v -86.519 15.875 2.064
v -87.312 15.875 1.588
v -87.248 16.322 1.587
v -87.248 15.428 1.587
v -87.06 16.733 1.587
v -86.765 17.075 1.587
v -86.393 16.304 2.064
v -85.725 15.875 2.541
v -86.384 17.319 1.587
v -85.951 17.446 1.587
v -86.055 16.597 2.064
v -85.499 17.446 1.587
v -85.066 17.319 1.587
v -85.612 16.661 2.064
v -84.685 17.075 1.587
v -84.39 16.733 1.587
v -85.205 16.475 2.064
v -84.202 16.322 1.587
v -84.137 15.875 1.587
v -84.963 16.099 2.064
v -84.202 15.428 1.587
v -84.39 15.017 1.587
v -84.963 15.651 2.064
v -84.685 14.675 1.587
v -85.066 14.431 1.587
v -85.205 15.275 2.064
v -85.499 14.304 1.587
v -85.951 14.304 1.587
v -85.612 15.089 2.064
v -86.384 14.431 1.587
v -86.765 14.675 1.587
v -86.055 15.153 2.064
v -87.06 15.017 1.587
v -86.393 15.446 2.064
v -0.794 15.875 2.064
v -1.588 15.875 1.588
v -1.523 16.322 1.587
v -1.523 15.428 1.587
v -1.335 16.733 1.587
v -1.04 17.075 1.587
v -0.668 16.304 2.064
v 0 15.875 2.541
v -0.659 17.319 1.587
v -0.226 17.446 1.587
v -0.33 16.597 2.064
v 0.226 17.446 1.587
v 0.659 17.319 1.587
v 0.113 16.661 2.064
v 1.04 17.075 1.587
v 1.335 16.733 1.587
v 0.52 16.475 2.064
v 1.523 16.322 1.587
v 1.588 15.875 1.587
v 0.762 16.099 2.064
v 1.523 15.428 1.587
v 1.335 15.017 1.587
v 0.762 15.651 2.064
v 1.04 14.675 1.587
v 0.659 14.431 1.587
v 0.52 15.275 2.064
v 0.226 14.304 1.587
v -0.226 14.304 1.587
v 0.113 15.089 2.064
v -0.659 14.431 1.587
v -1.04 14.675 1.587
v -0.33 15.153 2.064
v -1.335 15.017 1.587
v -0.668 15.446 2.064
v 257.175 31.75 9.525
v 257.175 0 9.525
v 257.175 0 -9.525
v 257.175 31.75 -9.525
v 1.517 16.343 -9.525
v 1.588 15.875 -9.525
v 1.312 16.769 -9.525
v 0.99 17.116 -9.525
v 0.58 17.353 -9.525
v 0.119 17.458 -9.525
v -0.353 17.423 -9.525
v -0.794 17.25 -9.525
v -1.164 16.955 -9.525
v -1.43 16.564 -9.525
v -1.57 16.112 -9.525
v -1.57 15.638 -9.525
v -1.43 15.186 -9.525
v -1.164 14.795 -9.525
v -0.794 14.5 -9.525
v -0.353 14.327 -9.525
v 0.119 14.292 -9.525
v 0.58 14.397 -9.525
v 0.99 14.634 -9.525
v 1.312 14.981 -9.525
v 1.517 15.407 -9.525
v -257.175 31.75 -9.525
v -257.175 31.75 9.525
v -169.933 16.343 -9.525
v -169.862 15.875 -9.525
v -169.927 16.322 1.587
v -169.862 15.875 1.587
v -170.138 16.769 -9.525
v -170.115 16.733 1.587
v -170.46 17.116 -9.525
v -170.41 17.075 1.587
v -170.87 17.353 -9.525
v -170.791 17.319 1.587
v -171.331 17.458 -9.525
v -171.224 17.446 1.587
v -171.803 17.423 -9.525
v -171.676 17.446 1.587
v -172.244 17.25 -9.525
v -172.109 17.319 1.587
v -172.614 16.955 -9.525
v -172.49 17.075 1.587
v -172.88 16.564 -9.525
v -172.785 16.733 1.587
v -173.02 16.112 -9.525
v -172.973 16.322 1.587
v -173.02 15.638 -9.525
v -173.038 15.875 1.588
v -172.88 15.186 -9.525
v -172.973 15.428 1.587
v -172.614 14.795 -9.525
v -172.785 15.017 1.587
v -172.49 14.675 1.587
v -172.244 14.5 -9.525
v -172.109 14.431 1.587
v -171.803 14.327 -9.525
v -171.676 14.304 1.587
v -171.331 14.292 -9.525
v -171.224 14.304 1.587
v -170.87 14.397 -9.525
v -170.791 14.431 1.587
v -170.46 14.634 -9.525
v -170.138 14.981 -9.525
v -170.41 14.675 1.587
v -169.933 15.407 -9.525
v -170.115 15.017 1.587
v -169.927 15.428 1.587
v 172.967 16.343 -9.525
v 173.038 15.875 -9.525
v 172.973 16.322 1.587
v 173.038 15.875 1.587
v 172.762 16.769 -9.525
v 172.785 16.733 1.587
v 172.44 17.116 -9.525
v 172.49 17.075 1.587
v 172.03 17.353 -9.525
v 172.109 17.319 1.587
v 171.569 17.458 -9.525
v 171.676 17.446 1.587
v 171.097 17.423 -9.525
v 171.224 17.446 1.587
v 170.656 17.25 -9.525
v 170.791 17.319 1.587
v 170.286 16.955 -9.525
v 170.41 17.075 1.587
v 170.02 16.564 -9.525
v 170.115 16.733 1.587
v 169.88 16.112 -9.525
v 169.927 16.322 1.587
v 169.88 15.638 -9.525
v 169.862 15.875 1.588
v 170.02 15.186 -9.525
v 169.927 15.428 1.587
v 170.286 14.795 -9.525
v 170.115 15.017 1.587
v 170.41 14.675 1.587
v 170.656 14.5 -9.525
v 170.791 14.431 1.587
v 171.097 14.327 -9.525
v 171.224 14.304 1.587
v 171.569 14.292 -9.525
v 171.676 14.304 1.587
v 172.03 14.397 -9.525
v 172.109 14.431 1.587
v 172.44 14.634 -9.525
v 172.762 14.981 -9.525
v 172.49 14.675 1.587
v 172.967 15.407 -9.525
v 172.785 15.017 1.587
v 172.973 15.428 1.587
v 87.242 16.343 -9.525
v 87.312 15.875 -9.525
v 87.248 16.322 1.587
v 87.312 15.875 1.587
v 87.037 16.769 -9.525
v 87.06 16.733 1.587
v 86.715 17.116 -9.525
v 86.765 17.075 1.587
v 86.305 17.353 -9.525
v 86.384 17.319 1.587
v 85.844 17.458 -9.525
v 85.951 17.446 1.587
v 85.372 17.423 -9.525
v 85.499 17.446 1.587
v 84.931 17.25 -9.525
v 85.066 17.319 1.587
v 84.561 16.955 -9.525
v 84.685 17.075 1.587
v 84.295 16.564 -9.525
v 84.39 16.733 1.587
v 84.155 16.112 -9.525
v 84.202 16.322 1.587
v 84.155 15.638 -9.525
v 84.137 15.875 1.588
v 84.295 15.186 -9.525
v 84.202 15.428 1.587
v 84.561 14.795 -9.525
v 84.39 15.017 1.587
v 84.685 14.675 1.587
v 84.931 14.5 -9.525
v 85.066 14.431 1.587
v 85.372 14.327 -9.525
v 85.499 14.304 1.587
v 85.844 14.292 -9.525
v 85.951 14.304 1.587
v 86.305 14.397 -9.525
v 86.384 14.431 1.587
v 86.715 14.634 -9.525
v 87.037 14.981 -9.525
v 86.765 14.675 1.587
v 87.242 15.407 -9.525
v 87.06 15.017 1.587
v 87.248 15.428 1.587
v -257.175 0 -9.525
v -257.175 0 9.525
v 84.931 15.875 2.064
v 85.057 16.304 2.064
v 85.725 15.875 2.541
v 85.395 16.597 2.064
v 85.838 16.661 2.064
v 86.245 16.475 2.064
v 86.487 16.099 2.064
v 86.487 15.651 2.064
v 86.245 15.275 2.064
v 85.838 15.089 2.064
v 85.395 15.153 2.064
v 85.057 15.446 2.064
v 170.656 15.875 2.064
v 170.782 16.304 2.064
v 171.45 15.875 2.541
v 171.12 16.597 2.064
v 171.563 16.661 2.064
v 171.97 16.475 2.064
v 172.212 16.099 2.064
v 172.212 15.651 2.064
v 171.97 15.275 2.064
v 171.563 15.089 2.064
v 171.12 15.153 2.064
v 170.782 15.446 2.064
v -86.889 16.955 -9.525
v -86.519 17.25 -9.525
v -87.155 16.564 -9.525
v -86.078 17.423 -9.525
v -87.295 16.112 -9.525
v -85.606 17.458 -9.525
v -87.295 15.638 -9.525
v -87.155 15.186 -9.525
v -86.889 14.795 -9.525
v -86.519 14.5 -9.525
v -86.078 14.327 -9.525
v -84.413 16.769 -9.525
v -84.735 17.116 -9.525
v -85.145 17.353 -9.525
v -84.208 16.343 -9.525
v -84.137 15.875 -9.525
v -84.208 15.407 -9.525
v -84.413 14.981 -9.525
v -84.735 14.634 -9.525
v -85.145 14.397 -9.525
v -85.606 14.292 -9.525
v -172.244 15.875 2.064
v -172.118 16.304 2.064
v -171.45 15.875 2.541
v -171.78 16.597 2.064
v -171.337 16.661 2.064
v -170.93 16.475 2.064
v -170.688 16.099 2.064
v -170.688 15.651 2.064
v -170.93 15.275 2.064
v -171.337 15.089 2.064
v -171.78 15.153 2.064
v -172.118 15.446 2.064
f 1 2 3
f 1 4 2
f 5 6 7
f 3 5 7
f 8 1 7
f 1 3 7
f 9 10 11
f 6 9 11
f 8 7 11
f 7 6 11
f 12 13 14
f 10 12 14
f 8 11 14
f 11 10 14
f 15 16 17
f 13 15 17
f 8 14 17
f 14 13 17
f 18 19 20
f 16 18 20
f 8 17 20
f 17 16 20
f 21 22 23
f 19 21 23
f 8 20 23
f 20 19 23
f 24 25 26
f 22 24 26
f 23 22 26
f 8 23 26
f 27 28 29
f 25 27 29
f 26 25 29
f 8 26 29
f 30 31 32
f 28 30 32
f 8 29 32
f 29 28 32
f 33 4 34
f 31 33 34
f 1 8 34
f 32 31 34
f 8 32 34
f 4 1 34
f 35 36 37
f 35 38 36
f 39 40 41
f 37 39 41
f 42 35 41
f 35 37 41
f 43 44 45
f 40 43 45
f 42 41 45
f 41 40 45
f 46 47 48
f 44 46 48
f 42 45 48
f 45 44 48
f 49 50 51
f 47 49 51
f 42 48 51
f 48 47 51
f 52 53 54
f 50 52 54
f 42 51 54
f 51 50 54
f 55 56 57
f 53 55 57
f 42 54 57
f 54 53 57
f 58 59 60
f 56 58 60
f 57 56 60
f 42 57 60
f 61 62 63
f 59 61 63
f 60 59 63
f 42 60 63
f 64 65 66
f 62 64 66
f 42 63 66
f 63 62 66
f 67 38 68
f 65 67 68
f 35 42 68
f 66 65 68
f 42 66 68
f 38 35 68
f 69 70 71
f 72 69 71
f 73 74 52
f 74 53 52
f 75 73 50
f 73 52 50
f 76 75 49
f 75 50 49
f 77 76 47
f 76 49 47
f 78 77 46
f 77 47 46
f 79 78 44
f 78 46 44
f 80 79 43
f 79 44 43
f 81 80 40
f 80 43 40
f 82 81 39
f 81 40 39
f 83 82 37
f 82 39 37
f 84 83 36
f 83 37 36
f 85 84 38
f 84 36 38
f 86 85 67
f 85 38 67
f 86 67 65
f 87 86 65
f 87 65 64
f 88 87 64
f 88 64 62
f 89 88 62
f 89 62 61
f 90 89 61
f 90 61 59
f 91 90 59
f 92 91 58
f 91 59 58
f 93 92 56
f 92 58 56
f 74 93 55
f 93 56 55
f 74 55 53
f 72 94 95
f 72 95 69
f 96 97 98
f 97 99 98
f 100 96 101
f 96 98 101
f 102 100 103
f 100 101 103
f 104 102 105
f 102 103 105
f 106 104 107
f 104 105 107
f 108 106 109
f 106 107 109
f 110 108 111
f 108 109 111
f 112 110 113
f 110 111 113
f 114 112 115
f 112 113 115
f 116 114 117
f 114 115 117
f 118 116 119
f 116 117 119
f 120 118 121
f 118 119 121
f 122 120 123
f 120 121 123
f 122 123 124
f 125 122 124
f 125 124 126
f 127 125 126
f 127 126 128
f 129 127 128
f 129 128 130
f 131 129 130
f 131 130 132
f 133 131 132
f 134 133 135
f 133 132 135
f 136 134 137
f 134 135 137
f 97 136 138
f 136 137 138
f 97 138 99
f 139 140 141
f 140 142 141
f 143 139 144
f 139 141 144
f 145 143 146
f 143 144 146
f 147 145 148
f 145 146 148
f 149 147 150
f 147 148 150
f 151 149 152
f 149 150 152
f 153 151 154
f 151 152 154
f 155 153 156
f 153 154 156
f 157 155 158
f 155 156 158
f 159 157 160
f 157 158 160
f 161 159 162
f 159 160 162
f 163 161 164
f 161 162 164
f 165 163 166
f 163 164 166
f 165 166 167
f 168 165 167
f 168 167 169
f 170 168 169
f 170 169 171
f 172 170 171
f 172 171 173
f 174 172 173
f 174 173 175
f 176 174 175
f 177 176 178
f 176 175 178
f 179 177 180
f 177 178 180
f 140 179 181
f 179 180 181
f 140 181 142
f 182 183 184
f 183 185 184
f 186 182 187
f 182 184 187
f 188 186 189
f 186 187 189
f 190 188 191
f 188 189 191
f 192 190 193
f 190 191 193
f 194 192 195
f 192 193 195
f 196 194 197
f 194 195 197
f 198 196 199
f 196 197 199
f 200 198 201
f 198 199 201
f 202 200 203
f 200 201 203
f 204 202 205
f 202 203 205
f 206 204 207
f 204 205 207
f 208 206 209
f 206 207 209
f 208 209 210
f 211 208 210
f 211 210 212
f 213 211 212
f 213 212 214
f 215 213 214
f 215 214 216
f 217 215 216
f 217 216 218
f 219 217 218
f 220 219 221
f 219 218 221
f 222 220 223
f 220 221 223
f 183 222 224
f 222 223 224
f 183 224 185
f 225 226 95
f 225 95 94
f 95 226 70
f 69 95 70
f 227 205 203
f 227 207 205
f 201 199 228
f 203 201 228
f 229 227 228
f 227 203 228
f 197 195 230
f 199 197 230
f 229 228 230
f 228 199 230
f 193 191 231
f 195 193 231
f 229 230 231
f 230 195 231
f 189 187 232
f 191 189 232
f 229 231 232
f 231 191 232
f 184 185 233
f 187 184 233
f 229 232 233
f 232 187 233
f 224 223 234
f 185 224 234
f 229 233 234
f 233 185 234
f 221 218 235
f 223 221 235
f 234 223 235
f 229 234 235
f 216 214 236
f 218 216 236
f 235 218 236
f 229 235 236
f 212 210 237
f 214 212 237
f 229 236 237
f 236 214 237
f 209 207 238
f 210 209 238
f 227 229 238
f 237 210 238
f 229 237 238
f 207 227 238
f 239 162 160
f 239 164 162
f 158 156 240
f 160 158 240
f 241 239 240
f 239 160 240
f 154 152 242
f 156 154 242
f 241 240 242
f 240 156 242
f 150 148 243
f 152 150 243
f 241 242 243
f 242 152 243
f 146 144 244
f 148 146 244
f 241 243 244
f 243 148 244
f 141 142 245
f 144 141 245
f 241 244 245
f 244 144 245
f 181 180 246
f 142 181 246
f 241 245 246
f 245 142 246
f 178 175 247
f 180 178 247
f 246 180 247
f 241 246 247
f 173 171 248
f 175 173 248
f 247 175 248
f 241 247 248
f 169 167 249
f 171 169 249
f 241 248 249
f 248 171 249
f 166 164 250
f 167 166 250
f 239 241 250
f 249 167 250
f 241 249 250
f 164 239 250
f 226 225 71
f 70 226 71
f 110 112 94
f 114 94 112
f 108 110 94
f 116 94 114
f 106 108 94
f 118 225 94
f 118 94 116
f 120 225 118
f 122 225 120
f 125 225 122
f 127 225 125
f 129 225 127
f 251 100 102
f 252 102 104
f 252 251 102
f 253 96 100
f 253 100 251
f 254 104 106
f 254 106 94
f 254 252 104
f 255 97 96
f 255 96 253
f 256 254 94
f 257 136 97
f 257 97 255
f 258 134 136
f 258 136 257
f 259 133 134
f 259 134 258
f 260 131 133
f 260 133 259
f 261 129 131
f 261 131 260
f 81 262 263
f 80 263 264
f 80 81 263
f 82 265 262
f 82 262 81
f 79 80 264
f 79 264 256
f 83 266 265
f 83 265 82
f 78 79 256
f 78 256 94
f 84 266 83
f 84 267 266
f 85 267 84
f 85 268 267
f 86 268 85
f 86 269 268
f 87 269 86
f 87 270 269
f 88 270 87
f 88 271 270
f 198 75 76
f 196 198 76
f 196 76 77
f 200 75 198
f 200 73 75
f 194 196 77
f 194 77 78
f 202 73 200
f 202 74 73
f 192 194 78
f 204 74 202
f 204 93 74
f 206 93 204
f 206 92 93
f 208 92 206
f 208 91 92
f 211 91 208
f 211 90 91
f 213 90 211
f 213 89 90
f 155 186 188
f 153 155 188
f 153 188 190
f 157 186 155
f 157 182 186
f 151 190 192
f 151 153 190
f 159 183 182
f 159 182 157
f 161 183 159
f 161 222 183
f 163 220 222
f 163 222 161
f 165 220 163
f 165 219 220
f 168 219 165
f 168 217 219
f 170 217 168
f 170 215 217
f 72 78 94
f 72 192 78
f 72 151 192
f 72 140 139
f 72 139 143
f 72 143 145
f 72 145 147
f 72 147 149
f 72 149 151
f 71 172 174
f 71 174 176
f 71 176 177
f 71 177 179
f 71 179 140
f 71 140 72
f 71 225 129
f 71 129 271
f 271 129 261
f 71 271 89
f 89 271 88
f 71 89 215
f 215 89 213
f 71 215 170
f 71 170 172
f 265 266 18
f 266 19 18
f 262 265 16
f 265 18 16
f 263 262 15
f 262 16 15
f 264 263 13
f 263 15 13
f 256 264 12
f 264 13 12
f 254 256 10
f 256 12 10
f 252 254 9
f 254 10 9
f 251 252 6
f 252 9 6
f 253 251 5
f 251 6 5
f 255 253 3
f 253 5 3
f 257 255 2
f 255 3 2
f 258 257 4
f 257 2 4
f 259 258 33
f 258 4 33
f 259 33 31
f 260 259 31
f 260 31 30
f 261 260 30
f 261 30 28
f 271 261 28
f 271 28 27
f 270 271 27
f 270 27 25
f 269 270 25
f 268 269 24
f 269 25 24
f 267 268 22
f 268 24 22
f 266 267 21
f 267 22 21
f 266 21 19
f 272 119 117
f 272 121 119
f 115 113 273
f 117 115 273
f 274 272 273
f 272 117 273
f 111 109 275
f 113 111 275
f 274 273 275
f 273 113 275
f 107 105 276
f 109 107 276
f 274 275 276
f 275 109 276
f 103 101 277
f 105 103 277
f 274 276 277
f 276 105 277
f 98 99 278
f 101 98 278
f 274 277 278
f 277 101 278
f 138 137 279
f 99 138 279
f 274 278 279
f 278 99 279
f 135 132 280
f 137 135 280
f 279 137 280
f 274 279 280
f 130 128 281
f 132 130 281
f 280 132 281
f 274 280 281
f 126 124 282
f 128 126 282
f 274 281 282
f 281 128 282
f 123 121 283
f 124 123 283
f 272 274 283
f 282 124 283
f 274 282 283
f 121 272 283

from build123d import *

# Parameters (mm, degrees)
SKETCH1_W                        = 514.35
SKETCH1_H                        = 19.05
BOSS_EXTRUDE1_DEPTH              = 31.75
F_1_8_0_125_DIAMETER_HOLE1_D     = 3.175
F_1_8_0_125_DIAMETER_HOLE1_DEPTH = 11.1125
F_1_8_0_125_DIAMETER_HOLE1_TIP   = 0.953866233


with BuildPart() as part:
    # Sketch1 → Boss-Extrude1 (new body)
    with BuildSketch(Plane(origin=(0, 0, 0), x_dir=(1, 0, 0), z_dir=(0, 1, 0))):
        Rectangle(SKETCH1_W, SKETCH1_H)
    extrude(amount=BOSS_EXTRUDE1_DEPTH)

    # 1/8 (0.125) Diameter Hole1
    with Locations(Plane(origin=(0, 0, -9.525), x_dir=(-1, 0, 0), z_dir=(0, 0, -1))):
        with Locations((-171.45, 15.875), (-85.725, 15.875), (0, 15.875), (85.725, 15.875), (171.45, 15.875)):
            Hole(F_1_8_0_125_DIAMETER_HOLE1_D / 2, depth=F_1_8_0_125_DIAMETER_HOLE1_DEPTH)
            with Locations((0, 0, -(F_1_8_0_125_DIAMETER_HOLE1_DEPTH + F_1_8_0_125_DIAMETER_HOLE1_TIP / 2))):  # 118° drill point
                Cone(0, F_1_8_0_125_DIAMETER_HOLE1_D / 2, F_1_8_0_125_DIAMETER_HOLE1_TIP, mode=Mode.SUBTRACT)


solid = part.part
